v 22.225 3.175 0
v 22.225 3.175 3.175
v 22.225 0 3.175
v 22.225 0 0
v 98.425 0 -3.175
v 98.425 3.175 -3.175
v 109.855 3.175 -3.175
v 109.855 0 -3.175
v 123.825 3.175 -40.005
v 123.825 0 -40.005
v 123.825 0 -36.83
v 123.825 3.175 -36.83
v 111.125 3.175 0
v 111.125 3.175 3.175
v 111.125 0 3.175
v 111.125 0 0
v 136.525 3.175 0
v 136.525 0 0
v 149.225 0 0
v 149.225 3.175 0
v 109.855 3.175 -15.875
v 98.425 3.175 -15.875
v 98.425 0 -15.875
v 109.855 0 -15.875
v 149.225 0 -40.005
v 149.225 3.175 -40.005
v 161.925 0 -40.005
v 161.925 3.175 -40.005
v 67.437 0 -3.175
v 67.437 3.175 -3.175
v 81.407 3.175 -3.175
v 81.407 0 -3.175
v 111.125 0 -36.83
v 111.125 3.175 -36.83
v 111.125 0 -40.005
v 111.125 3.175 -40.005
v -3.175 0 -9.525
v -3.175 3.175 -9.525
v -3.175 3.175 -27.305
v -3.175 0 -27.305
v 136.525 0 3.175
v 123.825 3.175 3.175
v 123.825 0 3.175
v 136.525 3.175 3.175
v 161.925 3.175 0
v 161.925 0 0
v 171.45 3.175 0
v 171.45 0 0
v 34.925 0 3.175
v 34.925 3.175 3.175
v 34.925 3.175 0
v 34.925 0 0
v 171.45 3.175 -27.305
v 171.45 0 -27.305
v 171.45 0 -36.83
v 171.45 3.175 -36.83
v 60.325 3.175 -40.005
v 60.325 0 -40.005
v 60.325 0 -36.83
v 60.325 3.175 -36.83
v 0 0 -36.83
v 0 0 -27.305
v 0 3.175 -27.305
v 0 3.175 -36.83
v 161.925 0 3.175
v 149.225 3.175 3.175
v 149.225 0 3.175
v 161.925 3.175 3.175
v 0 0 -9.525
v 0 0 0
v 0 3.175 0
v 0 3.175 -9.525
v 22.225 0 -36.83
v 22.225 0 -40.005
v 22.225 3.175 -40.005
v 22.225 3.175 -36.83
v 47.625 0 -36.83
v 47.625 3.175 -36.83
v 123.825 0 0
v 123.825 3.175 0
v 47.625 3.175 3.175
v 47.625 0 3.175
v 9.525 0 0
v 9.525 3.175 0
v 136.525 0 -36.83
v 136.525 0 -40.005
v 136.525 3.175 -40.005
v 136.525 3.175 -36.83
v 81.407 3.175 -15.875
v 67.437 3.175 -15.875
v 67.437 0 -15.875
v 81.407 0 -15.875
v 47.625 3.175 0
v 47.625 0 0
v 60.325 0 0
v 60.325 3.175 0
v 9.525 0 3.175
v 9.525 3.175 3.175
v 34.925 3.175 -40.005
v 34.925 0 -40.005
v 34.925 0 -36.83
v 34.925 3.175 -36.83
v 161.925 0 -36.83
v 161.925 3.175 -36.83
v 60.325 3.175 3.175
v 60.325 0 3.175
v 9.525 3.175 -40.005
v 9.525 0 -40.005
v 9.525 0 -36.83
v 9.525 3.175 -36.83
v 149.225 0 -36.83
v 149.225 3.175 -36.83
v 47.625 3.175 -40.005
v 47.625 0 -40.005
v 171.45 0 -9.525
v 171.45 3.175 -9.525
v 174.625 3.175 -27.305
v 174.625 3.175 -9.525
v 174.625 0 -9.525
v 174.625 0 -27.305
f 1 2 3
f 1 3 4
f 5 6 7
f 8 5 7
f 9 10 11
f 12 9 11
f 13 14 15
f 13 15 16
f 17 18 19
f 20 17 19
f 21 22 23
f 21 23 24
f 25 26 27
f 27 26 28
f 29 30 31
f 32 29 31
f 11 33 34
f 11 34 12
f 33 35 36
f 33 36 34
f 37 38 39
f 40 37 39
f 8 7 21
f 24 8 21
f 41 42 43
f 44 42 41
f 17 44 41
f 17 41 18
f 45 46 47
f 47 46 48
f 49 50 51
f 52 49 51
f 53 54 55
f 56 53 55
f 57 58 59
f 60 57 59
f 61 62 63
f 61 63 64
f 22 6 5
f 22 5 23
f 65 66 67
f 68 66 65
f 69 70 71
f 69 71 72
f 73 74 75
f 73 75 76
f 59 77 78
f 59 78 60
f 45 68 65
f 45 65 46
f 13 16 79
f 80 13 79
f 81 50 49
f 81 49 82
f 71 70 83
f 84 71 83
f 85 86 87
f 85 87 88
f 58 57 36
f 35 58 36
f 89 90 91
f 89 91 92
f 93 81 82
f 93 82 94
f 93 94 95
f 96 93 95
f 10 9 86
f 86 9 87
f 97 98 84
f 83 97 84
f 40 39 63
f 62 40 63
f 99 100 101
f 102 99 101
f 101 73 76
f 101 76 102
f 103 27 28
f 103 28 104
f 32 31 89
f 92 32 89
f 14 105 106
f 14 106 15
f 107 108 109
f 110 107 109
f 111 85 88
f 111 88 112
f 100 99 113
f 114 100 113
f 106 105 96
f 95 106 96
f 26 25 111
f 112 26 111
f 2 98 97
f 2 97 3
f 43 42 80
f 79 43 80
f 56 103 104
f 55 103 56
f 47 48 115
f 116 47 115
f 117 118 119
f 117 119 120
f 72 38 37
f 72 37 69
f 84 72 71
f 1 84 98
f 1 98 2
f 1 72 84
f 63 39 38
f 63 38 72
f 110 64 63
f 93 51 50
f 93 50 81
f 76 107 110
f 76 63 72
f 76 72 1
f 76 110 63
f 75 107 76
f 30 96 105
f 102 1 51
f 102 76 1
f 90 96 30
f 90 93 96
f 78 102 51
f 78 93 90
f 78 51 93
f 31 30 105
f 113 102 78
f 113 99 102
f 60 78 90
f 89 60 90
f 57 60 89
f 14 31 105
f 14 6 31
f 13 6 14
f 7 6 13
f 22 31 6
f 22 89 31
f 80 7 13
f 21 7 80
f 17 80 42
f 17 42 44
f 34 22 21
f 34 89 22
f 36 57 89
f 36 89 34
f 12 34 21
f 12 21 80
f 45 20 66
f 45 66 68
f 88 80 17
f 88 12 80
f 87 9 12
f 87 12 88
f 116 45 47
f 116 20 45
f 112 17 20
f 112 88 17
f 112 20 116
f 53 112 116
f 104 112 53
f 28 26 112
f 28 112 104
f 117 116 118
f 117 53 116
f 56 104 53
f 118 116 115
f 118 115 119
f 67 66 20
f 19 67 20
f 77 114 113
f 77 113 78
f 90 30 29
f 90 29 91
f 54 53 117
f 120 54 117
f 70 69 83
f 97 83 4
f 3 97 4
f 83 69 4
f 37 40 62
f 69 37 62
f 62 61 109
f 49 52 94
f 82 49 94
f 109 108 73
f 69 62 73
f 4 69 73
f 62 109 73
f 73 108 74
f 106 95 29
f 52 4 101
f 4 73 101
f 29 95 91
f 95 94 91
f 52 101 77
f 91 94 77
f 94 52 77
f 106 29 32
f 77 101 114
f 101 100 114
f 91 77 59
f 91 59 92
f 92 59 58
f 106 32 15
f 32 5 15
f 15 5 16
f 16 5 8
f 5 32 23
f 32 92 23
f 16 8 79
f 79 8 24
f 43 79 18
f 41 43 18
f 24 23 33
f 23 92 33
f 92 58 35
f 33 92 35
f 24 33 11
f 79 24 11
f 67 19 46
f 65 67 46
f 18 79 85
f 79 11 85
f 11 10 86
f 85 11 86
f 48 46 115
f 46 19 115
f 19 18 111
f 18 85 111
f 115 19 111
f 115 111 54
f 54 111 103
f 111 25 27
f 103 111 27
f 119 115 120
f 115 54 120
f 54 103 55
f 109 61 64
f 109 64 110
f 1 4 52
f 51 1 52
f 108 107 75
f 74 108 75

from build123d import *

# Parameters (mm, degrees)
SKETCH1_W           = 171.45
SKETCH1_H           = 36.83
BOSS_EXTRUDE1_DEPTH = 3.175
SKETCH2_W           = 12.7
SKETCH2_H           = 3.175
SKETCH2_W_2         = 50.8
BOSS_EXTRUDE2_DEPTH = 3.175
SKETCH3_W           = 42.418
SKETCH3_H           = 12.7
CUT_EXTRUDE1_DEPTH  = 3.175
SKETCH5_W           = 17.018
SKETCH5_H           = 12.7
BOSS_EXTRUDE3_DEPTH = 3.175
SKETCH6_W           = 3.175
SKETCH6_H           = 17.78
BOSS_EXTRUDE4_DEPTH = 3.175


with BuildPart() as part:
    # Sketch1 → Boss-Extrude1 (new body)
    with BuildSketch(Plane(origin=(0, 0, 0), x_dir=(1, 0, 0), z_dir=(0, 1, 0))):
        with Locations((85.725, 18.415)):
            Rectangle(SKETCH1_W, SKETCH1_H)
    extrude(amount=BOSS_EXTRUDE1_DEPTH)

    # Sketch2 → Boss-Extrude2 (add)
    with BuildSketch(Plane(origin=(0, 3.175, 0), x_dir=(1, 0, 0), z_dir=(0, 1, 0))):
        with Locations((15.875, -1.5875)):
            Rectangle(SKETCH2_W, SKETCH2_H)
        with Locations((41.275, -1.5875)):
            Rectangle(SKETCH2_W, SKETCH2_H)
        with Locations((85.725, -1.5875)):
            Rectangle(SKETCH2_W_2, SKETCH2_H)
        with Locations((130.175, -1.5875)):
            Rectangle(SKETCH2_W, SKETCH2_H)
        with Locations((155.575, -1.5875)):
            Rectangle(SKETCH2_W, SKETCH2_H)
    boss_extrude2 = extrude(amount=-BOSS_EXTRUDE2_DEPTH)

    # Sketch3 → Cut-Extrude1 (cut)
    with BuildSketch(Plane(origin=(0, 3.175, 0), x_dir=(1, 0, 0), z_dir=(0, 1, 0))):
        with Locations((88.646, 9.525)):
            Rectangle(SKETCH3_W, SKETCH3_H)
    extrude(amount=-CUT_EXTRUDE1_DEPTH, mode=Mode.SUBTRACT)

    # Sketch5 → Boss-Extrude3 (add)
    with BuildSketch(Plane(origin=(0, 3.175, 0), x_dir=(1, 0, 0), z_dir=(0, 1, 0))):
        with Locations((89.916, 9.525)):
            Rectangle(SKETCH5_W, SKETCH5_H)
    extrude(amount=-BOSS_EXTRUDE3_DEPTH)

    # Sketch6 → Boss-Extrude4 (add)
    with BuildSketch(Plane(origin=(0, 3.175, 0), x_dir=(1, 0, 0), z_dir=(0, 1, 0))):
        with Locations((-1.5875, 18.415)):
            Rectangle(SKETCH6_W, SKETCH6_H)
        with Locations((173.0375, 18.415)):
            Rectangle(SKETCH6_W, SKETCH6_H)
    extrude(amount=-BOSS_EXTRUDE4_DEPTH)

    # Mirror1: Boss-Extrude2 across plane
    add(boss_extrude2.mirror(Plane(origin=(0, 0, -18.415), x_dir=(1, 0, 0), z_dir=(0, 0, -1))))


solid = part.part
